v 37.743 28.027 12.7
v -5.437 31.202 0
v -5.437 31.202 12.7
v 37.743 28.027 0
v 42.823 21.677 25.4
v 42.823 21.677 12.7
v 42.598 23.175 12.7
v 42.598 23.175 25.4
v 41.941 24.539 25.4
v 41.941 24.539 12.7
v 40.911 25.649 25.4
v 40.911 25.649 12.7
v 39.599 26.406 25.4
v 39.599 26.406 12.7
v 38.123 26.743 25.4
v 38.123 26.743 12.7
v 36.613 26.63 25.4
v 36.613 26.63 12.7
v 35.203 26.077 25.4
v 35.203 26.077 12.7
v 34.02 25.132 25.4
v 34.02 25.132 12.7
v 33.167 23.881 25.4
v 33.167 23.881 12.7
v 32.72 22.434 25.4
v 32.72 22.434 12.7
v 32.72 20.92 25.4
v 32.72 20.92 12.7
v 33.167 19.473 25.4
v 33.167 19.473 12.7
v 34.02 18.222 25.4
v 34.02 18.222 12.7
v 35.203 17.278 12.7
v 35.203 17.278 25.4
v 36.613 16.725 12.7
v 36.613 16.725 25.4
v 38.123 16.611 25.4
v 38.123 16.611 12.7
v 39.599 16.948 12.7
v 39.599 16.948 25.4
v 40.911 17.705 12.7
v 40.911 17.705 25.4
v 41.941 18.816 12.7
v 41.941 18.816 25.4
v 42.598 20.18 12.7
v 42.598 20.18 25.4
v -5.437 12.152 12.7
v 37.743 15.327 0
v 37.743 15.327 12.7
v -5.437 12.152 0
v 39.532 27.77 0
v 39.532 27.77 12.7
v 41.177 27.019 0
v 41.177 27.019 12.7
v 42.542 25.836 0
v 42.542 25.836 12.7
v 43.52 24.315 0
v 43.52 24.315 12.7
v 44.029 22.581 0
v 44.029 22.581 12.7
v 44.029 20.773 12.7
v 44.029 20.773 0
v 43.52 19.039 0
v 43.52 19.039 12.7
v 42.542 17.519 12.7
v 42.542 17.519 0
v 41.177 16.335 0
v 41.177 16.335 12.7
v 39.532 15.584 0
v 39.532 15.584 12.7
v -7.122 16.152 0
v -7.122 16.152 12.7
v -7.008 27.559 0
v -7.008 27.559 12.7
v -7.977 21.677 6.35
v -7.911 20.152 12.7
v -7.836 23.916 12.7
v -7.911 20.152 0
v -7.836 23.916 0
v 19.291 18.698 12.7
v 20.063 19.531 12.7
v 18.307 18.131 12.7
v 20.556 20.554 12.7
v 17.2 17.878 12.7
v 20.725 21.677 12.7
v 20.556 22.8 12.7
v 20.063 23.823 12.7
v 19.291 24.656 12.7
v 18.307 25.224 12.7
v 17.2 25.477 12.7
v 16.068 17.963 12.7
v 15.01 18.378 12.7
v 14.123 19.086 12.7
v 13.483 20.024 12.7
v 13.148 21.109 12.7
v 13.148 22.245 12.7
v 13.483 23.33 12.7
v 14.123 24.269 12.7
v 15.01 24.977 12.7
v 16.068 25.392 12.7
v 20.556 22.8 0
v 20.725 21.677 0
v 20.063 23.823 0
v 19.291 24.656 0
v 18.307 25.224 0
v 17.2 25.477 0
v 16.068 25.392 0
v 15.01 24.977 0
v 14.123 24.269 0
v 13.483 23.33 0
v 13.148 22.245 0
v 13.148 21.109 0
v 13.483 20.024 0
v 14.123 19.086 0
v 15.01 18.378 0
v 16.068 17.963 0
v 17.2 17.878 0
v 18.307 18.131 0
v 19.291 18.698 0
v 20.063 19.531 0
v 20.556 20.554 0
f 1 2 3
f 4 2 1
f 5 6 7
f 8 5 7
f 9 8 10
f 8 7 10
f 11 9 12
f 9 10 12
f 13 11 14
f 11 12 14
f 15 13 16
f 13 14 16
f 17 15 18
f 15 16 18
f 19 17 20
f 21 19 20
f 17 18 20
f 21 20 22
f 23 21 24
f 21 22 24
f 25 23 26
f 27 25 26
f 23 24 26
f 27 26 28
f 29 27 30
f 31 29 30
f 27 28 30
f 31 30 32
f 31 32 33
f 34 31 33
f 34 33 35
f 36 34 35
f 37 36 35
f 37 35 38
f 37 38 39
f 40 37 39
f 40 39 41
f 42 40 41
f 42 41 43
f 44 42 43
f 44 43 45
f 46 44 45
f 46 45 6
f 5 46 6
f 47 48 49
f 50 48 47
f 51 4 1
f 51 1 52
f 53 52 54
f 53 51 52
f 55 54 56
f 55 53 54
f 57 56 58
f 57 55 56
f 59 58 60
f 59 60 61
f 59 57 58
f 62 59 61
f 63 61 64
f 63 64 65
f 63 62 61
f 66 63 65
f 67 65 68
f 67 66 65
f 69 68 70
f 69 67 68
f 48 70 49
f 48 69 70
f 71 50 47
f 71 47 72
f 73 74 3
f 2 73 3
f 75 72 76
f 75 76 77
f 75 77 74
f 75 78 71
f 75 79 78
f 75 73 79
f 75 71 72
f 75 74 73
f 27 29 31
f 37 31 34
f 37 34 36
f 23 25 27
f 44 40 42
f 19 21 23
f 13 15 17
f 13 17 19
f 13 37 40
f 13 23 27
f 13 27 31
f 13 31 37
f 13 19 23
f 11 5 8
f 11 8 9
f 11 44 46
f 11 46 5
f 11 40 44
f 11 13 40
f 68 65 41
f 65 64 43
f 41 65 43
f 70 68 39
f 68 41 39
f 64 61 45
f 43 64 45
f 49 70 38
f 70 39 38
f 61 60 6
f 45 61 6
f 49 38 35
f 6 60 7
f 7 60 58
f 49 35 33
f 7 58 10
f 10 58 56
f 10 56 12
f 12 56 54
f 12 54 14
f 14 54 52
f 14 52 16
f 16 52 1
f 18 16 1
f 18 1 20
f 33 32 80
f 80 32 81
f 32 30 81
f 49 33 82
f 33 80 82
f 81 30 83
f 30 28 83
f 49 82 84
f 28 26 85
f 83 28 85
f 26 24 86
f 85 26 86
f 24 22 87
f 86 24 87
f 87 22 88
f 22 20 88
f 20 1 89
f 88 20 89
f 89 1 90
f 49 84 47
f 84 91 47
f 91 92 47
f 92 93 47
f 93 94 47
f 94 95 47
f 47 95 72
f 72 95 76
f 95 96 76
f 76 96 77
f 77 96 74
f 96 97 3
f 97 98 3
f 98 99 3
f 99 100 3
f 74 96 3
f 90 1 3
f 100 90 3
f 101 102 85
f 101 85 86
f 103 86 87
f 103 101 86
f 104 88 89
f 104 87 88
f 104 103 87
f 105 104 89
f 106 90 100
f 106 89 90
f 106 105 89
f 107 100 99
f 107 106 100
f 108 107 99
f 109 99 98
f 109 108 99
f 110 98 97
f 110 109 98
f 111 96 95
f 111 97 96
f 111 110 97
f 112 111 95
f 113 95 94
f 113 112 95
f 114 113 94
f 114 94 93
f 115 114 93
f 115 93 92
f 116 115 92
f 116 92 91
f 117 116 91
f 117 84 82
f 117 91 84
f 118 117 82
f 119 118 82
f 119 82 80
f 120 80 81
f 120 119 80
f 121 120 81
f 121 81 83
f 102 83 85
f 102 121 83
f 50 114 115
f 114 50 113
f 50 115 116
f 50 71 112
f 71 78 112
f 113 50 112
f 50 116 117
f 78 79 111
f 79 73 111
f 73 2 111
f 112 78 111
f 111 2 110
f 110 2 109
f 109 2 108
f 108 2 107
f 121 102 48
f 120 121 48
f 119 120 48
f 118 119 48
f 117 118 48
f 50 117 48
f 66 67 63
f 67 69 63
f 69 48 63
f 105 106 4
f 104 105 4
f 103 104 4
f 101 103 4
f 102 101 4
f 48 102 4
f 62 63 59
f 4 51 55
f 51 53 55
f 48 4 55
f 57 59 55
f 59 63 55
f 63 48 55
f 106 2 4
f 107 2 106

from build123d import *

# Parameters (mm, degrees)
BOSS_EXTRUDE1_DEPTH     = 12.7
SKETCH2_R               = 5.08
BOSS_EXTRUDE2_DEPTH     = 25.4
CUT_EXTRUDE1_DEPTH      = 6.858
CUT_EXTRUDE1_DEPTH_BACK = 12.954
SKETCH3_R               = 3.81


with BuildPart() as part:
    # Sketch1 → Boss-Extrude1 (new body)
    with BuildSketch(Plane.XY):
        with BuildLine():
            Line((-5.436566547, 31.20219701), (37.743433453, 28.02719701))
            ThreePointArc((37.743433453, 28.02719701), (44.093433453, 21.67719701), (37.743433453, 15.32719701))
            Line((37.743433453, 15.32719701), (-5.436566547, 12.15219701))
            add(Edge.make_bspline(
                [(-5.436566547, 12.15219701), (-10.516566547, 21.67719701), (-5.436566547, 31.20219701)],
                knots=[0, 0, 0, 1, 1, 1], degree=2))
        make_face()
    extrude(amount=BOSS_EXTRUDE1_DEPTH)

    # Sketch2 → Boss-Extrude2 (add)
    with BuildSketch(Plane.XY):
        with Locations((37.743433453, 21.67719701)):
            Circle(SKETCH2_R)
    extrude(amount=BOSS_EXTRUDE2_DEPTH)

    # Sketch3 → Cut-Extrude1 (cut, two sides: drawn at the far end of the back side and taken through both)
    with BuildSketch(Plane.XY.offset(12.7).offset(-CUT_EXTRUDE1_DEPTH_BACK)):
        with Locations((16.915433453, 21.67719701)):
            Circle(SKETCH3_R)
    extrude(amount=CUT_EXTRUDE1_DEPTH + CUT_EXTRUDE1_DEPTH_BACK, mode=Mode.SUBTRACT)


solid = part.part
